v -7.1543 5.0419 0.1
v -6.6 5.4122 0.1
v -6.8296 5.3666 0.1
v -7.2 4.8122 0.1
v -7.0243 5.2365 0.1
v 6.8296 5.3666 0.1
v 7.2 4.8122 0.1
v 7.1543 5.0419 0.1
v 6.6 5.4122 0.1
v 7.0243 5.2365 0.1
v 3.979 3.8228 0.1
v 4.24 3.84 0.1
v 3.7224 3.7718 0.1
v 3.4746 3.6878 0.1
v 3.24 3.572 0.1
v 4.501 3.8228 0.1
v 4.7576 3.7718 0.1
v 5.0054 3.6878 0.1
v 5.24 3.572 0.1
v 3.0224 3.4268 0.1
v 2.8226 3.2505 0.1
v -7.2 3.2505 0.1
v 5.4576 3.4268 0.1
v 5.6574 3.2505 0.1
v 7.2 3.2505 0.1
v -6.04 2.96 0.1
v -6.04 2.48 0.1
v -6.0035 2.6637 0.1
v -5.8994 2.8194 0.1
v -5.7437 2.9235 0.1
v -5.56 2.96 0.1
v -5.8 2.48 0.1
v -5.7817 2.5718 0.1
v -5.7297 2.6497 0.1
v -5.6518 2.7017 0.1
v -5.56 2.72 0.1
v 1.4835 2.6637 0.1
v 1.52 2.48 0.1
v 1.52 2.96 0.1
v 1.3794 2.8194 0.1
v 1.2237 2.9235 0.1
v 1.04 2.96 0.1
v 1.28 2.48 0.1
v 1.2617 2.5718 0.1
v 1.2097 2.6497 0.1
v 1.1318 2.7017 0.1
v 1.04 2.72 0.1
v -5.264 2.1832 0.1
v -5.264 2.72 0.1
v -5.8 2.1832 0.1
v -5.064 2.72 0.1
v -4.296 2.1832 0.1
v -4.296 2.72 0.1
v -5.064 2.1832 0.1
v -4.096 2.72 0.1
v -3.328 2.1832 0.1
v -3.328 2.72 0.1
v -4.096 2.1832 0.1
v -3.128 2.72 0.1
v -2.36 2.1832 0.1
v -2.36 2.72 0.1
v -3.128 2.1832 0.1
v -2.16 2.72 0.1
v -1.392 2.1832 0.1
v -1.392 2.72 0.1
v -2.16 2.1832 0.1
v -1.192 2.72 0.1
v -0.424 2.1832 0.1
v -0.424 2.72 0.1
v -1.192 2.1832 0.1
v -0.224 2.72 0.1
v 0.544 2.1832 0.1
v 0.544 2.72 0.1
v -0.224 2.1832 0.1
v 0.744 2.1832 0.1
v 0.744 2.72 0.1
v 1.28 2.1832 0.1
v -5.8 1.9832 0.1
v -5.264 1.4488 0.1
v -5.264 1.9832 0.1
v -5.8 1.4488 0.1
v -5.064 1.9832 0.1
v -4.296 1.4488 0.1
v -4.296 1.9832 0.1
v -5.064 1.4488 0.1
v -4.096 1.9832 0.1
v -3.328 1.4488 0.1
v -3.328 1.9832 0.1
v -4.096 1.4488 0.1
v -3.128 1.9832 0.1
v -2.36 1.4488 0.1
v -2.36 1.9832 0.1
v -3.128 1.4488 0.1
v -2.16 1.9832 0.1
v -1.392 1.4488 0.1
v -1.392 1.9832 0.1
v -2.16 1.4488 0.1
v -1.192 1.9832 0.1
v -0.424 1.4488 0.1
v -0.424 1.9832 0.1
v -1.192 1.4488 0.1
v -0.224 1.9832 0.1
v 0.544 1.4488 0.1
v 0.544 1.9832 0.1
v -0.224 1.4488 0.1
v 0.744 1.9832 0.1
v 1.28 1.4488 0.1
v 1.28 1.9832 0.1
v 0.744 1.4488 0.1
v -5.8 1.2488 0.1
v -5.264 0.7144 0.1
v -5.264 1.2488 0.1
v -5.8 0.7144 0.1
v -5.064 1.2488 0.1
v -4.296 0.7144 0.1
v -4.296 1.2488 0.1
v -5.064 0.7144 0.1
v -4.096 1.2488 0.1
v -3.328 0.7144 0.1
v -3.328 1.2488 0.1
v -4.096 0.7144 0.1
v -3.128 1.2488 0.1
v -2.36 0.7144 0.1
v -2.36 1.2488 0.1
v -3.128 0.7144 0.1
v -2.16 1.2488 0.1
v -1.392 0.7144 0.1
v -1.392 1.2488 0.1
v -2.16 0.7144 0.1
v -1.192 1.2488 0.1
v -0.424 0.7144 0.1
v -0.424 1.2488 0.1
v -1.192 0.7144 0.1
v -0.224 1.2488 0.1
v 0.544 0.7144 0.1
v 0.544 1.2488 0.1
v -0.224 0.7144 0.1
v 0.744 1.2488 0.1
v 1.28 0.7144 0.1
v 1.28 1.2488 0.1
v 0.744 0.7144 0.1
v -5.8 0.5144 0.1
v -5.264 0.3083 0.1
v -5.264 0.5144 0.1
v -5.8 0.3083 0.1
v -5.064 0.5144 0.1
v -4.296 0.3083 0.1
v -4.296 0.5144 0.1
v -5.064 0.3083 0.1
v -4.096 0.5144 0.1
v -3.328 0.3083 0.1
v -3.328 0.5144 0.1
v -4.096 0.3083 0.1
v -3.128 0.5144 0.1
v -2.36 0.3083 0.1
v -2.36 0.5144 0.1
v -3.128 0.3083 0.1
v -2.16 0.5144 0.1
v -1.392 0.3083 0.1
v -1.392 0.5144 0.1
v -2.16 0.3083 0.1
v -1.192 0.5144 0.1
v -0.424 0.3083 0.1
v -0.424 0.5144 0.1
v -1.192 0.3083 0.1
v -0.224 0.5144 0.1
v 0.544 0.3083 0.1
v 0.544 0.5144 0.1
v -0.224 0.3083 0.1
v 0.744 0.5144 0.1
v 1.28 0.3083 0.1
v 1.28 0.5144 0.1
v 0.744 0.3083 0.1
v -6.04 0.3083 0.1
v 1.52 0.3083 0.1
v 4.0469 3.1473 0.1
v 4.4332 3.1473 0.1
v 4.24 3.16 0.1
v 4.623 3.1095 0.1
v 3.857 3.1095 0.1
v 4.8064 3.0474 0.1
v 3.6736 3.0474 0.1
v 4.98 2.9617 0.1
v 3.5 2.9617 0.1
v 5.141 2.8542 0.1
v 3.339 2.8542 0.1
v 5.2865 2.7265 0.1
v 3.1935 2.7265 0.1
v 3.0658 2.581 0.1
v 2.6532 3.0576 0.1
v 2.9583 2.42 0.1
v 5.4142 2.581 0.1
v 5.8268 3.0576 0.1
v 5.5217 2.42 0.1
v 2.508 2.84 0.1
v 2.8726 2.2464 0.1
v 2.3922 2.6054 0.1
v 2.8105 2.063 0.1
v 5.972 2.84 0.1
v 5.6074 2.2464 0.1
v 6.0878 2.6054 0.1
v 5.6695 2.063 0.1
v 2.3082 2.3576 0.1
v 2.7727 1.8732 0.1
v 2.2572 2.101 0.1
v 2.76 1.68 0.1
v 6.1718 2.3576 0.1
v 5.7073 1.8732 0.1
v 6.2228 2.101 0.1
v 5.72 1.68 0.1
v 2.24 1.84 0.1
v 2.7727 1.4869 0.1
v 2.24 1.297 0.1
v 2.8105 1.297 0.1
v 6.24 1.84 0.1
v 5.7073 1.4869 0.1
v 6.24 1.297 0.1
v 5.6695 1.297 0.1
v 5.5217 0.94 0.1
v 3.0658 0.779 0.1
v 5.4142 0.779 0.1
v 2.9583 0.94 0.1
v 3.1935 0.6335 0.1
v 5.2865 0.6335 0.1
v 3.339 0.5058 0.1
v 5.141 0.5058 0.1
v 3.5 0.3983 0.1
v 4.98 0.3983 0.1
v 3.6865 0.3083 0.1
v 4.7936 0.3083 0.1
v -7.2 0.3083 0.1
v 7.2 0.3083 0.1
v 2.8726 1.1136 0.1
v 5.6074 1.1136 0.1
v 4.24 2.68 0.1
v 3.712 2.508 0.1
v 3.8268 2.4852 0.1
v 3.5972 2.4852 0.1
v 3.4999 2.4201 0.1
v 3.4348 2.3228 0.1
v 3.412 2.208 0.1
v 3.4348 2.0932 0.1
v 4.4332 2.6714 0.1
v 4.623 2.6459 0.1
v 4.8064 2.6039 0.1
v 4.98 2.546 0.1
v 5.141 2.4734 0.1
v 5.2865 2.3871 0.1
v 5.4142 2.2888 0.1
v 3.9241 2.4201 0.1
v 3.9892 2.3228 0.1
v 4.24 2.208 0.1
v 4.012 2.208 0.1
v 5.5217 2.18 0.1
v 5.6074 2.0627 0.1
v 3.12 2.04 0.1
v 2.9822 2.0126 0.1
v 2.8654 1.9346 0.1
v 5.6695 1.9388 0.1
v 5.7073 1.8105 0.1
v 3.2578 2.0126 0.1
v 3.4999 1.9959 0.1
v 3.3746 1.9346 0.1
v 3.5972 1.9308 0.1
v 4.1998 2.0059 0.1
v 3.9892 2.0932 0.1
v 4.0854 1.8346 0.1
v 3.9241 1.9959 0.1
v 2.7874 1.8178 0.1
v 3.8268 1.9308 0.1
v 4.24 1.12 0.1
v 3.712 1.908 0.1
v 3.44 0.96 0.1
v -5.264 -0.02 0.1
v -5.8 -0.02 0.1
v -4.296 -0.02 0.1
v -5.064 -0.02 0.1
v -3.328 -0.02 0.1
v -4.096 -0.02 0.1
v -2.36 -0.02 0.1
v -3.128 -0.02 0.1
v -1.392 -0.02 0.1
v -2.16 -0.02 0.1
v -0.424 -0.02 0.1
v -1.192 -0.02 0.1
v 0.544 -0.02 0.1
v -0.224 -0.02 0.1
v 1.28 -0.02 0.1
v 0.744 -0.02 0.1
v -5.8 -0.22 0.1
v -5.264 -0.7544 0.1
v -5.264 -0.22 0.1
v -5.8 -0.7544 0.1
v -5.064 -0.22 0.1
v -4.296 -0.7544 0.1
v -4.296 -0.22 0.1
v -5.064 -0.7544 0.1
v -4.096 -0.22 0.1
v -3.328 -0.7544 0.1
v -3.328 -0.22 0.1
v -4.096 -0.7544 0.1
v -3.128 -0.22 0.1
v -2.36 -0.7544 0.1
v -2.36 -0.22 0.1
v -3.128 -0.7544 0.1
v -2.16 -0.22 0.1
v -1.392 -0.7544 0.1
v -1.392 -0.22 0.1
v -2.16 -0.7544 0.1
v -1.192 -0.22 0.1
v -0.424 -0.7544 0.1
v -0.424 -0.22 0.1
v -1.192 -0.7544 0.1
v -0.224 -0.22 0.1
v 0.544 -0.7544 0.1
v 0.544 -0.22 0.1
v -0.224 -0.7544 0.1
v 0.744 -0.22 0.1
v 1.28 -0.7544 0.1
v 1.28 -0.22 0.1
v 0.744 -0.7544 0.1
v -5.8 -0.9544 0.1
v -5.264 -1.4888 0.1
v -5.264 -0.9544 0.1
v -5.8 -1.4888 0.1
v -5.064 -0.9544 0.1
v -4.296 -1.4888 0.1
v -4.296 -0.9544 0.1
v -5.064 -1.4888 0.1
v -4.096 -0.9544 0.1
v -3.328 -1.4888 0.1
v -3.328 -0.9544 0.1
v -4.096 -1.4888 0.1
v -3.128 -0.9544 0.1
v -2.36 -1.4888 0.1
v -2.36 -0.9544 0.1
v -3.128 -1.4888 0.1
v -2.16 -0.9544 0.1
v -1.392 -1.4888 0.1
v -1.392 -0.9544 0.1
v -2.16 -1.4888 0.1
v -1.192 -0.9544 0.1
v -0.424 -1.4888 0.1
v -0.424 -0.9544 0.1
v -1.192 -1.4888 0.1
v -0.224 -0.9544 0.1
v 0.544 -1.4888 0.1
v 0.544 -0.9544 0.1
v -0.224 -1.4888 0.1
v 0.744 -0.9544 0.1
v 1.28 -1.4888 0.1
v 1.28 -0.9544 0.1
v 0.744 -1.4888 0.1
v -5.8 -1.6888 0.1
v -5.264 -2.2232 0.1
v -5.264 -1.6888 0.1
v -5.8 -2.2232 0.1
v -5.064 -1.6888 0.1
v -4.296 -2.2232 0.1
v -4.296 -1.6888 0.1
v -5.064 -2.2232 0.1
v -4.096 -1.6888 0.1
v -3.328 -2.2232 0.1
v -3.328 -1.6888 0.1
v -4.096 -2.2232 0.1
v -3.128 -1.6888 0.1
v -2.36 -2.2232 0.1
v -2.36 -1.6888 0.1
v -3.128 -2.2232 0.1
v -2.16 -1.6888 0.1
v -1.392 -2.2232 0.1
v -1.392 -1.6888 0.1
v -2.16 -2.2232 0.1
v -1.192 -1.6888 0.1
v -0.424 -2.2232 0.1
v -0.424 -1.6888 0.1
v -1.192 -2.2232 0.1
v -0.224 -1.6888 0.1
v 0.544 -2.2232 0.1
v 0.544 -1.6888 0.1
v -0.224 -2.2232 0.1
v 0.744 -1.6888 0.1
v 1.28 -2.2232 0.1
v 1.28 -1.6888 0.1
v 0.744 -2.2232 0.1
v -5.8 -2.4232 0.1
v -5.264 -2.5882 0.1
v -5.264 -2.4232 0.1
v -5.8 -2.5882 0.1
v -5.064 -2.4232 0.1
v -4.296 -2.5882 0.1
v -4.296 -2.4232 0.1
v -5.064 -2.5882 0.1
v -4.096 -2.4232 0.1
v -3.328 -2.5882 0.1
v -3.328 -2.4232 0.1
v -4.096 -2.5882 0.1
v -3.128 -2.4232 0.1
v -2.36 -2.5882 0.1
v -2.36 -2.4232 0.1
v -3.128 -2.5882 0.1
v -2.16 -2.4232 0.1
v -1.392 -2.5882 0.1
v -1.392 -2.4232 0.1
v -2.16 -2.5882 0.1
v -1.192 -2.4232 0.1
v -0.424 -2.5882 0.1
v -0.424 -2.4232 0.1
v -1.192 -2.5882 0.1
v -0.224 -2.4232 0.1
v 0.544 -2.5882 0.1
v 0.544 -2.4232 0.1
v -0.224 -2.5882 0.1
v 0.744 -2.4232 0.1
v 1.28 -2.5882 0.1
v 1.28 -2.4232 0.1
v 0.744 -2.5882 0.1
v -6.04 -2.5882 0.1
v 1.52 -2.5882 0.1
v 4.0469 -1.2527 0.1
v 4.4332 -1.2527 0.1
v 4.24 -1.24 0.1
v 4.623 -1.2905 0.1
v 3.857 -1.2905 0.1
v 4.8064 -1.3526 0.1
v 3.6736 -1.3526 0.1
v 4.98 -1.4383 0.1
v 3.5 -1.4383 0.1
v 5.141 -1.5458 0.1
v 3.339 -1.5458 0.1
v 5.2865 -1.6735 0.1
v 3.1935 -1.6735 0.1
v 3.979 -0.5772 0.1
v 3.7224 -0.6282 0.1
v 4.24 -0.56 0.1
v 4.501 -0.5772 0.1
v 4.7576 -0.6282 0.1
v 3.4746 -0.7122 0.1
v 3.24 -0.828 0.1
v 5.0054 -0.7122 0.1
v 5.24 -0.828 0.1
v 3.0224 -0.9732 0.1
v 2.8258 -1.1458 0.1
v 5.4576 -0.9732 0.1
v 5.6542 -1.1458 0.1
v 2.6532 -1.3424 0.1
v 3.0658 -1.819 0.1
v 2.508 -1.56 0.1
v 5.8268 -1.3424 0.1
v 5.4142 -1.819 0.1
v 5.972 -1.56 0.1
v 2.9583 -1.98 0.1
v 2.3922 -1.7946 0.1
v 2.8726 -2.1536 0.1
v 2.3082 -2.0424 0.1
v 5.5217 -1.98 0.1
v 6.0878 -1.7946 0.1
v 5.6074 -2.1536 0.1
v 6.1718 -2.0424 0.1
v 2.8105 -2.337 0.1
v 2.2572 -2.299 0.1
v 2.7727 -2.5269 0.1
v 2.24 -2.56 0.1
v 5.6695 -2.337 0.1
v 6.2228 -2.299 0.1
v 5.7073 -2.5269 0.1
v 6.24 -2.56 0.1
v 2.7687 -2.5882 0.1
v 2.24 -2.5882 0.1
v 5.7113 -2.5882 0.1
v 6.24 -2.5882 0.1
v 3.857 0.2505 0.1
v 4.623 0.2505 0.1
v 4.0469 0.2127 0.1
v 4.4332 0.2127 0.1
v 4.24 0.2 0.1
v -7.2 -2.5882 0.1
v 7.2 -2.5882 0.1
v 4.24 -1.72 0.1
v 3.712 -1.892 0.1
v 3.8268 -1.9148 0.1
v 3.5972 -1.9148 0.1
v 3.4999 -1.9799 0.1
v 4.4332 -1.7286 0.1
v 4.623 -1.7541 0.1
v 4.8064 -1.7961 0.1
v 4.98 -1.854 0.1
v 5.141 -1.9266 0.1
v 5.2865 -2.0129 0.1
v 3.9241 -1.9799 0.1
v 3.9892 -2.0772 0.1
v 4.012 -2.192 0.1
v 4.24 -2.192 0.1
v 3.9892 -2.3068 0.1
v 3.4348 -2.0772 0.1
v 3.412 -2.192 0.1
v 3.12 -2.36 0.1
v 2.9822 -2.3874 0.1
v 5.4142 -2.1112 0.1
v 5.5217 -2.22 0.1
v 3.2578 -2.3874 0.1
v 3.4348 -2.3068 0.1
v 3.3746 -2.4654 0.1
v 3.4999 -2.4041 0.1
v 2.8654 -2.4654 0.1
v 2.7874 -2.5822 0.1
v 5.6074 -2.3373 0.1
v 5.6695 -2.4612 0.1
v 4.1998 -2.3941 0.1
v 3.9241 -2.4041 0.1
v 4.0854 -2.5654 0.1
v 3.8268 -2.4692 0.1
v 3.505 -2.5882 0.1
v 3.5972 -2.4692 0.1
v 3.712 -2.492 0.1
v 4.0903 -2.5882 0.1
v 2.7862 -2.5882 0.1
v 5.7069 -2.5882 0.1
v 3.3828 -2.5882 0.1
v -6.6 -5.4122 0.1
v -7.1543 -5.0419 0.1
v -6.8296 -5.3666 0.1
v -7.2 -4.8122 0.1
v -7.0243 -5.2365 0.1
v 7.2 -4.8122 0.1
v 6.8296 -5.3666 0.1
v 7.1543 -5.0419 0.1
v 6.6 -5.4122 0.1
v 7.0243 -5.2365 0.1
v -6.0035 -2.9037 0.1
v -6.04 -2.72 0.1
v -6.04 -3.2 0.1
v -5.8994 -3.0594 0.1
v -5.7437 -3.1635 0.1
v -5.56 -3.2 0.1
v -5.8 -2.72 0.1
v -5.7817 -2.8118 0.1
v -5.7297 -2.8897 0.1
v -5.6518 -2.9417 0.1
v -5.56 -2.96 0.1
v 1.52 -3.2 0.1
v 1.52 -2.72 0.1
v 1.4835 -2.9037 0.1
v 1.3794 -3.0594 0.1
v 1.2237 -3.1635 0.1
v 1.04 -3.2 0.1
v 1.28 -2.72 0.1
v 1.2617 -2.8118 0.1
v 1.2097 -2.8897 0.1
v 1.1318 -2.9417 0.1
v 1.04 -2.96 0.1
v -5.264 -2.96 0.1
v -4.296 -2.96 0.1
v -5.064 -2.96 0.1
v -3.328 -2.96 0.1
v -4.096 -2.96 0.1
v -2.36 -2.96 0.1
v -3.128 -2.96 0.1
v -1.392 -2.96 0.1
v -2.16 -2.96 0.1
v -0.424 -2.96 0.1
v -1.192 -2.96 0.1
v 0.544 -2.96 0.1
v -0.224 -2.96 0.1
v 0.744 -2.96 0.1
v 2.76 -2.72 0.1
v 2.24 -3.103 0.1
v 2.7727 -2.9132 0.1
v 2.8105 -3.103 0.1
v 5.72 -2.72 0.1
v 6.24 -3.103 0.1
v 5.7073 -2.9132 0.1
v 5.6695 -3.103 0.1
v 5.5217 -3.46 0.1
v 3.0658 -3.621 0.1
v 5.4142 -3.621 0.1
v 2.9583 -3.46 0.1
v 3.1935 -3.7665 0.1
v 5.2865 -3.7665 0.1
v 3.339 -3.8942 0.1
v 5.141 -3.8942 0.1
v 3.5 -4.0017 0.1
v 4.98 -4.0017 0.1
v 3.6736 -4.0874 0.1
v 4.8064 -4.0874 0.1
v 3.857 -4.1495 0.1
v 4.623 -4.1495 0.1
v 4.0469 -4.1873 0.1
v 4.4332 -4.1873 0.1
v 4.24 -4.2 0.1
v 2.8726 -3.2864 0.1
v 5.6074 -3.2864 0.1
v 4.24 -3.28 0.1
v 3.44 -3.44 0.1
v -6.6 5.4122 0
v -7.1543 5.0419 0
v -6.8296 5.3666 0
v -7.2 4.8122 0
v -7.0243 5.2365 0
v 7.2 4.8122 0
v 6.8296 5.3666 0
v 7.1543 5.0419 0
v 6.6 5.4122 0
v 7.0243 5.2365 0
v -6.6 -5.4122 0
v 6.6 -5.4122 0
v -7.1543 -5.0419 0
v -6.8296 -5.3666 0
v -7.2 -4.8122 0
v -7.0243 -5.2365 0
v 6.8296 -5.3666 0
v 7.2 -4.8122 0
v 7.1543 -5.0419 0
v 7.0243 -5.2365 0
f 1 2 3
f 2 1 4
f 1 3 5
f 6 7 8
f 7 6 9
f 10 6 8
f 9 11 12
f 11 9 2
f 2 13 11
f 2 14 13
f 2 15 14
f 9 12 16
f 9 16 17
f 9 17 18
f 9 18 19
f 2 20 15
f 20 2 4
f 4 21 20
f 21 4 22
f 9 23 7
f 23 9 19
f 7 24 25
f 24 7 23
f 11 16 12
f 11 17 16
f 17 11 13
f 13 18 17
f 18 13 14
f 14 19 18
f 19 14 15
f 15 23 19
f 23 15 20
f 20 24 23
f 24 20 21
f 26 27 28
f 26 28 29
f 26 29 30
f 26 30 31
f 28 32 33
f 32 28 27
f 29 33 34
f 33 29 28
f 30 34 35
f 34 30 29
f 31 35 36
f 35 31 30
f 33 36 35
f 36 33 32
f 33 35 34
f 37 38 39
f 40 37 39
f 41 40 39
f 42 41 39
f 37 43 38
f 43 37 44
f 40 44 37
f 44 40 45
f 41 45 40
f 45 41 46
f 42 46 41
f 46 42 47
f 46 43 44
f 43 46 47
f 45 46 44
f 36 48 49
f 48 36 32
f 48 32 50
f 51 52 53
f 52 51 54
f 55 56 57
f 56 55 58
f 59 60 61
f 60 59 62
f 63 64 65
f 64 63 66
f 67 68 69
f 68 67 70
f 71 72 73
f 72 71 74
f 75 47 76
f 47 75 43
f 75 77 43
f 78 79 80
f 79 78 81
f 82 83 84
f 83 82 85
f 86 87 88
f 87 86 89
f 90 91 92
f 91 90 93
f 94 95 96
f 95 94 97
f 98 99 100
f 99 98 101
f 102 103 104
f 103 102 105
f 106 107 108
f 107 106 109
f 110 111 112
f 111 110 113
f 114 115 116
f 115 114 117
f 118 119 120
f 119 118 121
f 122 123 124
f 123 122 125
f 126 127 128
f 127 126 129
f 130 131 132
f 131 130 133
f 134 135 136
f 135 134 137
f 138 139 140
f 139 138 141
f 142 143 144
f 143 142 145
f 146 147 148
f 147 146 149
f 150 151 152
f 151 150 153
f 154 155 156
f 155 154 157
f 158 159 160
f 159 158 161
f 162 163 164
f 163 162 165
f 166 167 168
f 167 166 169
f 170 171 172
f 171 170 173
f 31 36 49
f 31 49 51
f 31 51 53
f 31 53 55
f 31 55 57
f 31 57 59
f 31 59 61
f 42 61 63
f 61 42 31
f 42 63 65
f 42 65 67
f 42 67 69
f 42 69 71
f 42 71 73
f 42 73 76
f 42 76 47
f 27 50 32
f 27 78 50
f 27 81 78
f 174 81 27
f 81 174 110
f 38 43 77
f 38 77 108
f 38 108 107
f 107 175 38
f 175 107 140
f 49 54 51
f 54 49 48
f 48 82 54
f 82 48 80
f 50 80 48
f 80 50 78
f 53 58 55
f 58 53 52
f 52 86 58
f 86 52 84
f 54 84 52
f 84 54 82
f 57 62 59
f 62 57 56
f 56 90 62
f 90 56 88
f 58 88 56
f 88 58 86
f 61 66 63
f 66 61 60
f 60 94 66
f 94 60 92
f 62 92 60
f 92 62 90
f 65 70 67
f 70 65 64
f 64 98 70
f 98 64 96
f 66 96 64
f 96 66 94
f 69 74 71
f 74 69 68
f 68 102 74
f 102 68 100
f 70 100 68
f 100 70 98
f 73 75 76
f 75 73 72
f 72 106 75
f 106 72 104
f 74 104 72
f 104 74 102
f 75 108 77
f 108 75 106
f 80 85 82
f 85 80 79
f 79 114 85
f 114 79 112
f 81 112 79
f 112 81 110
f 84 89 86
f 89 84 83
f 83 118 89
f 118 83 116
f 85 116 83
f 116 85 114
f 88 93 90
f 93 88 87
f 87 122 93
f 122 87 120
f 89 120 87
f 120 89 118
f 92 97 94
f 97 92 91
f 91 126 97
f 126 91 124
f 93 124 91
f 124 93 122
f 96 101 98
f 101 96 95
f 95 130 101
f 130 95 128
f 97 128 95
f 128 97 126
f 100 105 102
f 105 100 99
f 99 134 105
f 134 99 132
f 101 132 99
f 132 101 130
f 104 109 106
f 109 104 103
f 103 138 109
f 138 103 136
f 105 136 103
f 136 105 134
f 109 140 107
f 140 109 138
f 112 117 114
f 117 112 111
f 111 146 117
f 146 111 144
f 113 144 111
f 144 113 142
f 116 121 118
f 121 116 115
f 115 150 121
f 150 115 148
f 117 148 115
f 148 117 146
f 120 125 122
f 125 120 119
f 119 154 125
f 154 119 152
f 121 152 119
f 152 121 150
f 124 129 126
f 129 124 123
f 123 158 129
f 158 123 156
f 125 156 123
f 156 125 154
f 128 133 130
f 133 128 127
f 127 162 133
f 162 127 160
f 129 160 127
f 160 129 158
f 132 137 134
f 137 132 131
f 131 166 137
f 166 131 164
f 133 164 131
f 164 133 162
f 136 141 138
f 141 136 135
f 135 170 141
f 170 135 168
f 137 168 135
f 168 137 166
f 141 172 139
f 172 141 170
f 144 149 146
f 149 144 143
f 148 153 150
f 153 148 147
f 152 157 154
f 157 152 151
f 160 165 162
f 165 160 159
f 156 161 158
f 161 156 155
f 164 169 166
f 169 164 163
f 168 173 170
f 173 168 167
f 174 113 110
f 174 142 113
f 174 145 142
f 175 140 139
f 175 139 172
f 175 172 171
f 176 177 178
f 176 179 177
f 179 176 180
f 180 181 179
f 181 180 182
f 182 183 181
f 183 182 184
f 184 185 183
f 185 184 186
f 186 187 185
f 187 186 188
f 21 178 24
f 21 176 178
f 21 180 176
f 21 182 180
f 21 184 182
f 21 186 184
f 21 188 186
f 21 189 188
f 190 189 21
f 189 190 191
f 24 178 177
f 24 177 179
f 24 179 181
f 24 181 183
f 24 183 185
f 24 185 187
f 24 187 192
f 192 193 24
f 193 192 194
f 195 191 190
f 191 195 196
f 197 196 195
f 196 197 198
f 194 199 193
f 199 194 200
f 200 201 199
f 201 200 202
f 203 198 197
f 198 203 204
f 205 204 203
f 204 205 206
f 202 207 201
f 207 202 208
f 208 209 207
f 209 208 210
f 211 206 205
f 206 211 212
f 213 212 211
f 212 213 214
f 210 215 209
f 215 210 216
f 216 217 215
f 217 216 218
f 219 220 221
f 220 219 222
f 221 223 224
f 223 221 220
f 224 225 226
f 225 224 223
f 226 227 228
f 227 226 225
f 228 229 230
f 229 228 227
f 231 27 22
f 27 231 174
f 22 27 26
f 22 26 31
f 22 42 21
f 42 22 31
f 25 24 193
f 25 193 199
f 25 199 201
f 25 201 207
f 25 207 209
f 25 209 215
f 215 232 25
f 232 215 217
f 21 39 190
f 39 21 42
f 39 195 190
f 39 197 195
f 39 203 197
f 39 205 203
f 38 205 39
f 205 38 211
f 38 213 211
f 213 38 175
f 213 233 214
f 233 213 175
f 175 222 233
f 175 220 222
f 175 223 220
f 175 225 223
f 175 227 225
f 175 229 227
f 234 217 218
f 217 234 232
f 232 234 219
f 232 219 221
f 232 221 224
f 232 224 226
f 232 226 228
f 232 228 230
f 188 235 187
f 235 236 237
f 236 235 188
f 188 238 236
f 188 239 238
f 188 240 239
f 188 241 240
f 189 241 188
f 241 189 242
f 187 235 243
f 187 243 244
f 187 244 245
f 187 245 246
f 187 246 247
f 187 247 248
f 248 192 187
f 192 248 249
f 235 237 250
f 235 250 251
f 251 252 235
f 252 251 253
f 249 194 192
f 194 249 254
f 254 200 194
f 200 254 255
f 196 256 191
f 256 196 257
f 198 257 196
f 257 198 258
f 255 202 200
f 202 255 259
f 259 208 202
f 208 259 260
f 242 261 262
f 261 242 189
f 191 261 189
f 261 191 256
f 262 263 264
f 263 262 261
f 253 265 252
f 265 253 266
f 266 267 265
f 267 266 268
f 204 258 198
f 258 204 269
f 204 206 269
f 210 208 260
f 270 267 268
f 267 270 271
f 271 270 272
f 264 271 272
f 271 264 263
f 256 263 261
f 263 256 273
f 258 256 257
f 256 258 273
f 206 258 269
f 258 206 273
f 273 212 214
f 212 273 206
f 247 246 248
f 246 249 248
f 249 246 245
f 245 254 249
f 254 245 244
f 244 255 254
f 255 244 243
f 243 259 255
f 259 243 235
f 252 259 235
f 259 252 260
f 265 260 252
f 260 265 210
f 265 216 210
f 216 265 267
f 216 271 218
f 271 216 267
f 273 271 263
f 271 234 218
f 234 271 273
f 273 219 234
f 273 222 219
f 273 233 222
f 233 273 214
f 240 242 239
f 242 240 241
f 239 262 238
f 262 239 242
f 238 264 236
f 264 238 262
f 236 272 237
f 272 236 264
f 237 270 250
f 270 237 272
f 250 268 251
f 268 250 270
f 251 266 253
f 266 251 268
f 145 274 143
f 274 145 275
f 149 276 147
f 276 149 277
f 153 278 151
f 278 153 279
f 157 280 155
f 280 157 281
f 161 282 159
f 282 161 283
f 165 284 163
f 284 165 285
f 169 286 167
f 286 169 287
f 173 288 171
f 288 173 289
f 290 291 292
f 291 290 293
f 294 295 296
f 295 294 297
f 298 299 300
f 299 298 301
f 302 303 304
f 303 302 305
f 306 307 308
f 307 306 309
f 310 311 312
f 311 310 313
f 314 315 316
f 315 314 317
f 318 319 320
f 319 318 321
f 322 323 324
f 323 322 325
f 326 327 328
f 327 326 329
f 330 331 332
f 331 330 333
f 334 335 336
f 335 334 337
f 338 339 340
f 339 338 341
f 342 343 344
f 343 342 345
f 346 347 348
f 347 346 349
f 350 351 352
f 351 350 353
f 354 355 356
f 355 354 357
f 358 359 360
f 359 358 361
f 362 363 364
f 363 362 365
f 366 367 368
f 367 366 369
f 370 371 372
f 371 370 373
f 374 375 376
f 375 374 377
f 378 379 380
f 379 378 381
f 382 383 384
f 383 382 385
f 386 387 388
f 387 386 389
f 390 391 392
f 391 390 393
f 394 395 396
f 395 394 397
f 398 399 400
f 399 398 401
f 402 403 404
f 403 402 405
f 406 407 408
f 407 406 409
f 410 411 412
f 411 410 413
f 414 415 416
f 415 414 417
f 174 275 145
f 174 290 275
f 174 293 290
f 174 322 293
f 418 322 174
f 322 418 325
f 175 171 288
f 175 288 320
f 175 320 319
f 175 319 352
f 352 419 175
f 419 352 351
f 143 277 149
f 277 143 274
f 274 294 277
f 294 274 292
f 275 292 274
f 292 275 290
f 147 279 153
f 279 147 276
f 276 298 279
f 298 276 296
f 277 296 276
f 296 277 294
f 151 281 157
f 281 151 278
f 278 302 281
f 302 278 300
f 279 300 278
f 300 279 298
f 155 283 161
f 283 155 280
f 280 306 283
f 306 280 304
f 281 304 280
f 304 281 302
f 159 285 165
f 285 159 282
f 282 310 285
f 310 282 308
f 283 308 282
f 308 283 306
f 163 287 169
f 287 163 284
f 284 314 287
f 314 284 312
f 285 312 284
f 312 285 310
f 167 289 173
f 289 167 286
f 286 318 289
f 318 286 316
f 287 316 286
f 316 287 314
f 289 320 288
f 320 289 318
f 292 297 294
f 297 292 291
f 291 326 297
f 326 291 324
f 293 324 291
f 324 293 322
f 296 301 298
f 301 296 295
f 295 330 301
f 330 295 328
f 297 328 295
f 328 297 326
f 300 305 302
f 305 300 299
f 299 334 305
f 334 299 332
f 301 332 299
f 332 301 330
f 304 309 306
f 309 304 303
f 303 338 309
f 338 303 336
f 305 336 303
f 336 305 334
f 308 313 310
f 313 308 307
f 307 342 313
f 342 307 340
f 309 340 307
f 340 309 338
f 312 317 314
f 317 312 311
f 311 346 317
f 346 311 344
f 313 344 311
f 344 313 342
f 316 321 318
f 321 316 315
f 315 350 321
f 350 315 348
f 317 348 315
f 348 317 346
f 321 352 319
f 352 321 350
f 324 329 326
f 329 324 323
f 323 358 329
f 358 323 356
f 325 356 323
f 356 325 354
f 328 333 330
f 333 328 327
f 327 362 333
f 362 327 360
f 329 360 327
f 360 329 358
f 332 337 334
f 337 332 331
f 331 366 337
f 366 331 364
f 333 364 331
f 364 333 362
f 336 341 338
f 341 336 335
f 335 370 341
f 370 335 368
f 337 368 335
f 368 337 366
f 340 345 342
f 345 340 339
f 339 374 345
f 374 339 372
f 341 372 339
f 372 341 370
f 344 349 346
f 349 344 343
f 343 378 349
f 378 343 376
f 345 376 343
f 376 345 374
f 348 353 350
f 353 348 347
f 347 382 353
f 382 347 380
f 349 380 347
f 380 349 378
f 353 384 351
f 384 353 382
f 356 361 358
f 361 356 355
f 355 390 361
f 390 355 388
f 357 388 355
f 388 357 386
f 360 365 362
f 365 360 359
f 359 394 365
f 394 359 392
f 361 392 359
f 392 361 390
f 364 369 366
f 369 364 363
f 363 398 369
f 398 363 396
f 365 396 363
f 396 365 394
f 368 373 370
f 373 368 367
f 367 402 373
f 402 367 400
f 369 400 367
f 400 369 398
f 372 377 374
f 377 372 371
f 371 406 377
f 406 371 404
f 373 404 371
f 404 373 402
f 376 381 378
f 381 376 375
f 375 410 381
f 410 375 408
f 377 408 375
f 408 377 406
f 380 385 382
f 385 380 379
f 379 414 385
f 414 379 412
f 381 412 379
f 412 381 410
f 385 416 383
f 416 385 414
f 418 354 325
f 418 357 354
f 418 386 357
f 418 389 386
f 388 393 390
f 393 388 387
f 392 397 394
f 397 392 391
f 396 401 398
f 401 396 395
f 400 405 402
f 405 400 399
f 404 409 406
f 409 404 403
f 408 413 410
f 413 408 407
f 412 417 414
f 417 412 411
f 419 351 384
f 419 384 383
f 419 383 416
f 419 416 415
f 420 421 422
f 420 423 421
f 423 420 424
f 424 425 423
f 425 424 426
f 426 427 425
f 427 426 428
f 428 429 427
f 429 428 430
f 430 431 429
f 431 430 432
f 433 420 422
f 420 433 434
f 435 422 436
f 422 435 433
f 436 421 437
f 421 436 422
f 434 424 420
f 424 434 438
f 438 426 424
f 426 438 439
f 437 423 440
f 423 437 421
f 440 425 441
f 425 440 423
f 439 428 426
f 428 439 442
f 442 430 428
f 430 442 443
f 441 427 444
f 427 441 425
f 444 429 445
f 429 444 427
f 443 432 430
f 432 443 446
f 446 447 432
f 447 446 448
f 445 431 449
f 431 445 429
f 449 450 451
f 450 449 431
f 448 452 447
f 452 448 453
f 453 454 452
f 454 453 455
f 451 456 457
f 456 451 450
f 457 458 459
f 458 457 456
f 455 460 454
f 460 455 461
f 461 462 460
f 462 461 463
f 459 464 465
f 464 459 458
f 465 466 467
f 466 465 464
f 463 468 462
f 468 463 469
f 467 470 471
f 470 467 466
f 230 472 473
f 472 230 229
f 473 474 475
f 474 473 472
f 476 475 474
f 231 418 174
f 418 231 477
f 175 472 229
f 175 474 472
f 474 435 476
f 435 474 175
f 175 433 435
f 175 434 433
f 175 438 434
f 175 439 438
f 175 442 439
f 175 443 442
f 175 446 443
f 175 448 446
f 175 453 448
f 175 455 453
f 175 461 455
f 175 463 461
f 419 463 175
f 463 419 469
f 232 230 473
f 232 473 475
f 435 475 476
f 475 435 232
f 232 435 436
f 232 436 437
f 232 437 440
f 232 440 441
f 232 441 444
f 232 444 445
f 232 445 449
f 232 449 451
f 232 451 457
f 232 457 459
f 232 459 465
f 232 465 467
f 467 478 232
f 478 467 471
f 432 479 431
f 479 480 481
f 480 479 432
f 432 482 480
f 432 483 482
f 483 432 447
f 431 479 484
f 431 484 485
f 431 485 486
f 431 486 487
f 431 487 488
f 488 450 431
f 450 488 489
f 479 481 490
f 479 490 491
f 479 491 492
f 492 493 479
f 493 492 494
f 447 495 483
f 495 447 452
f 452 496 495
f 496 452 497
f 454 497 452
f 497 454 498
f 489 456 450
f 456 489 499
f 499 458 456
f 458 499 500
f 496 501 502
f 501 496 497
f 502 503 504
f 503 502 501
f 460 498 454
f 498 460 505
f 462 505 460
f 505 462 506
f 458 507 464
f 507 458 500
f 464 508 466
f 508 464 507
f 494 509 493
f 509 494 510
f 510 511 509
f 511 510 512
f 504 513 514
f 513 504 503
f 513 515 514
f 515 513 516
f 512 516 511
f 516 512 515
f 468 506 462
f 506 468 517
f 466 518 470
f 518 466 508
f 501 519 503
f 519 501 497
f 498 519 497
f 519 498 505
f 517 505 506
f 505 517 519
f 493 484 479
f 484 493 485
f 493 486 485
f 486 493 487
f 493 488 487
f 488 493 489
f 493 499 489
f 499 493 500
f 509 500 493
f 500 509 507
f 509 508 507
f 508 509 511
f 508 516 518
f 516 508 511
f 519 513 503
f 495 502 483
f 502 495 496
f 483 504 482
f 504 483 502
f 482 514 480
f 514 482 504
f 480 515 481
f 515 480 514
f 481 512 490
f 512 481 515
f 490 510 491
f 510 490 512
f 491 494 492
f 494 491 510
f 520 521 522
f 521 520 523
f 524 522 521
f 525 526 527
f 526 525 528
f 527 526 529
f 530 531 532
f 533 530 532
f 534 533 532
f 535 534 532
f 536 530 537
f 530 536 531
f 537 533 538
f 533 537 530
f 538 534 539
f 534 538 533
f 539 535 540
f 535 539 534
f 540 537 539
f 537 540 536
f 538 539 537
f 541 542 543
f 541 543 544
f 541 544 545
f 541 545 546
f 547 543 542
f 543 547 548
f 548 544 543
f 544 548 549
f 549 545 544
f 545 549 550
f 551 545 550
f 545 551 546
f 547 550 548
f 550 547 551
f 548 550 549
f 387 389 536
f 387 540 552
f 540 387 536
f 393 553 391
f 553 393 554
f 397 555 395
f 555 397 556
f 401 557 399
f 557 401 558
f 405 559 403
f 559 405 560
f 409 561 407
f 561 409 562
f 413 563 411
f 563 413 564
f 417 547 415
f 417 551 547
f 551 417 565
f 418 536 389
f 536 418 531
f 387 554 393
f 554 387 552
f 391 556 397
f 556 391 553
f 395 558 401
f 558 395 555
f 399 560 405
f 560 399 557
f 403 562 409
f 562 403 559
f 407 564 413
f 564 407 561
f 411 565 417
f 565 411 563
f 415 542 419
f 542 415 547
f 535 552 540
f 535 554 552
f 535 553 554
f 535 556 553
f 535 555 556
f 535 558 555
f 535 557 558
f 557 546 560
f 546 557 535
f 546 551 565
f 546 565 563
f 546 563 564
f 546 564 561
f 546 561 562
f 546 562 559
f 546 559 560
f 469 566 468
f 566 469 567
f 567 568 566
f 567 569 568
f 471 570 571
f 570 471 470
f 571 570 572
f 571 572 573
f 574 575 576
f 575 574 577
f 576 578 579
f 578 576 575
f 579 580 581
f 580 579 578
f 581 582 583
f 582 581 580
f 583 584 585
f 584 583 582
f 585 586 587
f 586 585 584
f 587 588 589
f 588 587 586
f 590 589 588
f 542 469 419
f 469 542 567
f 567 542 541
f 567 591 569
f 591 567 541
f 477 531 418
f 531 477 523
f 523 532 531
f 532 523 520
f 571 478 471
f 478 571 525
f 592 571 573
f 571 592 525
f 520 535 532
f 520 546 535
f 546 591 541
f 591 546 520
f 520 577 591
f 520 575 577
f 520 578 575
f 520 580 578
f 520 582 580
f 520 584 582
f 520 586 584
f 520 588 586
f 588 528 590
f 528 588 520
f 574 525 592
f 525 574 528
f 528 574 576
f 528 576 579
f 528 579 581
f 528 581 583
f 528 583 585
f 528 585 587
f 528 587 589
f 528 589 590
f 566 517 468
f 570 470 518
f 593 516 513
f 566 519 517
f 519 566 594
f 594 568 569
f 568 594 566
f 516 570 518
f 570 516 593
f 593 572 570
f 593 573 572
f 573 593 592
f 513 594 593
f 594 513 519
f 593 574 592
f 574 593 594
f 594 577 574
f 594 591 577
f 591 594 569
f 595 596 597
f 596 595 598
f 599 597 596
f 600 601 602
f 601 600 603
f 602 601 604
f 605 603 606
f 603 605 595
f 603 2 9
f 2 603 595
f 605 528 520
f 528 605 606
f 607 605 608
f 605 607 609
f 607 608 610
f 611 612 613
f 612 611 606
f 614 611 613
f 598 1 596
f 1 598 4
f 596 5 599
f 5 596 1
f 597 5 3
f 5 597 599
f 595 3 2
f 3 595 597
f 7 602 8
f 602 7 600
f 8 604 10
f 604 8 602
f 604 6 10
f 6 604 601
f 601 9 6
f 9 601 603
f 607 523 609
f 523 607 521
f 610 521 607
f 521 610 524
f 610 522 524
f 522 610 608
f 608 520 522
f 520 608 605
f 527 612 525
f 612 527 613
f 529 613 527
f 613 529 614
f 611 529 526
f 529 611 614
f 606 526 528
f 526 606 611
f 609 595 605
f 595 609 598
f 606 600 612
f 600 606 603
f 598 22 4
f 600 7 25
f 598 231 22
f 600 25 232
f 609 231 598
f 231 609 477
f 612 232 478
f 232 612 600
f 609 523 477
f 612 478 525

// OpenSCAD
use <../lib.scad>
use <s/6177969ds01.scad>
use <s/6177969ds02.scad>
use <s/6177969ds03.scad>
use <s/6177969ds04.scad>
use <s/6177969ds05.scad>
function ldraw_lib__6177969d() = [
// 0 Sticker  1.4 x  1.8 with Grey Air Vent and Red Taillamp on Black Background Right
// 0 Name: 6177969d.dat
// 0 Author: Massimo Maso [Sirio]
// 0 !LDRAW_ORG Part UPDATE 2024-08
// 0 !LICENSE Licensed under CC BY 4.0 : see CAreadme.txt
// 
// 0 BFC CERTIFY CCW
  [0,"BFC","CERTIFY"],
  [0,"BFC","CCW"],
// 
// 0 !KEYWORDS 1966, Bricklink 75881stk01, Brickowl 507382, Ford, GT40
// 0 !KEYWORDS Rebrickable 30897, Set 75881, Speed Champions
// 
// 0 !HISTORY 2024-09-30 [OrionP] Official Update 2024-08
// 
// 
// 1 16 0 0 8.1384 1 0 0 0 1 0 0 0 1 s\6177969ds01.dat
  [1,16,0,0,8.1384,1,0,0,0,1,0,0,0,1, ldraw_lib__s__6177969ds01()],
// 1 16 0 0 8.1142 1 0 0 0 1 0 0 0 1 s\6177969ds02.dat
  [1,16,0,0,8.1142,1,0,0,0,1,0,0,0,1, ldraw_lib__s__6177969ds02()],
// 1 16 0 0 -6.4577 1 0 0 0 1 0 0 0 1 s\6177969ds03.dat
  [1,16,0,0,-6.4577,1,0,0,0,1,0,0,0,1, ldraw_lib__s__6177969ds03()],
// 1 16 0 0 -6.4833 1 0 0 0 1 0 0 0 1 s\6177969ds04.dat
  [1,16,0,0,-6.4833,1,0,0,0,1,0,0,0,1, ldraw_lib__s__6177969ds04()],
// 1 16 0 0 0 1 0 0 0 1 0 0 0 1 s\6177969ds05.dat
  [1,16,0,0,0,1,0,0,0,1,0,0,0,1, ldraw_lib__s__6177969ds05()],
];
module ldraw_lib__6177969d(step=0, col=false, unit=2/5, alt=false, line=0.2, solid=!$preview)
    makepoly(ldraw_lib__6177969d(), step=step, col=col, unit=unit, alt=alt, line=line, solid=solid);
ldraw_lib__6177969d(line=0.2);
